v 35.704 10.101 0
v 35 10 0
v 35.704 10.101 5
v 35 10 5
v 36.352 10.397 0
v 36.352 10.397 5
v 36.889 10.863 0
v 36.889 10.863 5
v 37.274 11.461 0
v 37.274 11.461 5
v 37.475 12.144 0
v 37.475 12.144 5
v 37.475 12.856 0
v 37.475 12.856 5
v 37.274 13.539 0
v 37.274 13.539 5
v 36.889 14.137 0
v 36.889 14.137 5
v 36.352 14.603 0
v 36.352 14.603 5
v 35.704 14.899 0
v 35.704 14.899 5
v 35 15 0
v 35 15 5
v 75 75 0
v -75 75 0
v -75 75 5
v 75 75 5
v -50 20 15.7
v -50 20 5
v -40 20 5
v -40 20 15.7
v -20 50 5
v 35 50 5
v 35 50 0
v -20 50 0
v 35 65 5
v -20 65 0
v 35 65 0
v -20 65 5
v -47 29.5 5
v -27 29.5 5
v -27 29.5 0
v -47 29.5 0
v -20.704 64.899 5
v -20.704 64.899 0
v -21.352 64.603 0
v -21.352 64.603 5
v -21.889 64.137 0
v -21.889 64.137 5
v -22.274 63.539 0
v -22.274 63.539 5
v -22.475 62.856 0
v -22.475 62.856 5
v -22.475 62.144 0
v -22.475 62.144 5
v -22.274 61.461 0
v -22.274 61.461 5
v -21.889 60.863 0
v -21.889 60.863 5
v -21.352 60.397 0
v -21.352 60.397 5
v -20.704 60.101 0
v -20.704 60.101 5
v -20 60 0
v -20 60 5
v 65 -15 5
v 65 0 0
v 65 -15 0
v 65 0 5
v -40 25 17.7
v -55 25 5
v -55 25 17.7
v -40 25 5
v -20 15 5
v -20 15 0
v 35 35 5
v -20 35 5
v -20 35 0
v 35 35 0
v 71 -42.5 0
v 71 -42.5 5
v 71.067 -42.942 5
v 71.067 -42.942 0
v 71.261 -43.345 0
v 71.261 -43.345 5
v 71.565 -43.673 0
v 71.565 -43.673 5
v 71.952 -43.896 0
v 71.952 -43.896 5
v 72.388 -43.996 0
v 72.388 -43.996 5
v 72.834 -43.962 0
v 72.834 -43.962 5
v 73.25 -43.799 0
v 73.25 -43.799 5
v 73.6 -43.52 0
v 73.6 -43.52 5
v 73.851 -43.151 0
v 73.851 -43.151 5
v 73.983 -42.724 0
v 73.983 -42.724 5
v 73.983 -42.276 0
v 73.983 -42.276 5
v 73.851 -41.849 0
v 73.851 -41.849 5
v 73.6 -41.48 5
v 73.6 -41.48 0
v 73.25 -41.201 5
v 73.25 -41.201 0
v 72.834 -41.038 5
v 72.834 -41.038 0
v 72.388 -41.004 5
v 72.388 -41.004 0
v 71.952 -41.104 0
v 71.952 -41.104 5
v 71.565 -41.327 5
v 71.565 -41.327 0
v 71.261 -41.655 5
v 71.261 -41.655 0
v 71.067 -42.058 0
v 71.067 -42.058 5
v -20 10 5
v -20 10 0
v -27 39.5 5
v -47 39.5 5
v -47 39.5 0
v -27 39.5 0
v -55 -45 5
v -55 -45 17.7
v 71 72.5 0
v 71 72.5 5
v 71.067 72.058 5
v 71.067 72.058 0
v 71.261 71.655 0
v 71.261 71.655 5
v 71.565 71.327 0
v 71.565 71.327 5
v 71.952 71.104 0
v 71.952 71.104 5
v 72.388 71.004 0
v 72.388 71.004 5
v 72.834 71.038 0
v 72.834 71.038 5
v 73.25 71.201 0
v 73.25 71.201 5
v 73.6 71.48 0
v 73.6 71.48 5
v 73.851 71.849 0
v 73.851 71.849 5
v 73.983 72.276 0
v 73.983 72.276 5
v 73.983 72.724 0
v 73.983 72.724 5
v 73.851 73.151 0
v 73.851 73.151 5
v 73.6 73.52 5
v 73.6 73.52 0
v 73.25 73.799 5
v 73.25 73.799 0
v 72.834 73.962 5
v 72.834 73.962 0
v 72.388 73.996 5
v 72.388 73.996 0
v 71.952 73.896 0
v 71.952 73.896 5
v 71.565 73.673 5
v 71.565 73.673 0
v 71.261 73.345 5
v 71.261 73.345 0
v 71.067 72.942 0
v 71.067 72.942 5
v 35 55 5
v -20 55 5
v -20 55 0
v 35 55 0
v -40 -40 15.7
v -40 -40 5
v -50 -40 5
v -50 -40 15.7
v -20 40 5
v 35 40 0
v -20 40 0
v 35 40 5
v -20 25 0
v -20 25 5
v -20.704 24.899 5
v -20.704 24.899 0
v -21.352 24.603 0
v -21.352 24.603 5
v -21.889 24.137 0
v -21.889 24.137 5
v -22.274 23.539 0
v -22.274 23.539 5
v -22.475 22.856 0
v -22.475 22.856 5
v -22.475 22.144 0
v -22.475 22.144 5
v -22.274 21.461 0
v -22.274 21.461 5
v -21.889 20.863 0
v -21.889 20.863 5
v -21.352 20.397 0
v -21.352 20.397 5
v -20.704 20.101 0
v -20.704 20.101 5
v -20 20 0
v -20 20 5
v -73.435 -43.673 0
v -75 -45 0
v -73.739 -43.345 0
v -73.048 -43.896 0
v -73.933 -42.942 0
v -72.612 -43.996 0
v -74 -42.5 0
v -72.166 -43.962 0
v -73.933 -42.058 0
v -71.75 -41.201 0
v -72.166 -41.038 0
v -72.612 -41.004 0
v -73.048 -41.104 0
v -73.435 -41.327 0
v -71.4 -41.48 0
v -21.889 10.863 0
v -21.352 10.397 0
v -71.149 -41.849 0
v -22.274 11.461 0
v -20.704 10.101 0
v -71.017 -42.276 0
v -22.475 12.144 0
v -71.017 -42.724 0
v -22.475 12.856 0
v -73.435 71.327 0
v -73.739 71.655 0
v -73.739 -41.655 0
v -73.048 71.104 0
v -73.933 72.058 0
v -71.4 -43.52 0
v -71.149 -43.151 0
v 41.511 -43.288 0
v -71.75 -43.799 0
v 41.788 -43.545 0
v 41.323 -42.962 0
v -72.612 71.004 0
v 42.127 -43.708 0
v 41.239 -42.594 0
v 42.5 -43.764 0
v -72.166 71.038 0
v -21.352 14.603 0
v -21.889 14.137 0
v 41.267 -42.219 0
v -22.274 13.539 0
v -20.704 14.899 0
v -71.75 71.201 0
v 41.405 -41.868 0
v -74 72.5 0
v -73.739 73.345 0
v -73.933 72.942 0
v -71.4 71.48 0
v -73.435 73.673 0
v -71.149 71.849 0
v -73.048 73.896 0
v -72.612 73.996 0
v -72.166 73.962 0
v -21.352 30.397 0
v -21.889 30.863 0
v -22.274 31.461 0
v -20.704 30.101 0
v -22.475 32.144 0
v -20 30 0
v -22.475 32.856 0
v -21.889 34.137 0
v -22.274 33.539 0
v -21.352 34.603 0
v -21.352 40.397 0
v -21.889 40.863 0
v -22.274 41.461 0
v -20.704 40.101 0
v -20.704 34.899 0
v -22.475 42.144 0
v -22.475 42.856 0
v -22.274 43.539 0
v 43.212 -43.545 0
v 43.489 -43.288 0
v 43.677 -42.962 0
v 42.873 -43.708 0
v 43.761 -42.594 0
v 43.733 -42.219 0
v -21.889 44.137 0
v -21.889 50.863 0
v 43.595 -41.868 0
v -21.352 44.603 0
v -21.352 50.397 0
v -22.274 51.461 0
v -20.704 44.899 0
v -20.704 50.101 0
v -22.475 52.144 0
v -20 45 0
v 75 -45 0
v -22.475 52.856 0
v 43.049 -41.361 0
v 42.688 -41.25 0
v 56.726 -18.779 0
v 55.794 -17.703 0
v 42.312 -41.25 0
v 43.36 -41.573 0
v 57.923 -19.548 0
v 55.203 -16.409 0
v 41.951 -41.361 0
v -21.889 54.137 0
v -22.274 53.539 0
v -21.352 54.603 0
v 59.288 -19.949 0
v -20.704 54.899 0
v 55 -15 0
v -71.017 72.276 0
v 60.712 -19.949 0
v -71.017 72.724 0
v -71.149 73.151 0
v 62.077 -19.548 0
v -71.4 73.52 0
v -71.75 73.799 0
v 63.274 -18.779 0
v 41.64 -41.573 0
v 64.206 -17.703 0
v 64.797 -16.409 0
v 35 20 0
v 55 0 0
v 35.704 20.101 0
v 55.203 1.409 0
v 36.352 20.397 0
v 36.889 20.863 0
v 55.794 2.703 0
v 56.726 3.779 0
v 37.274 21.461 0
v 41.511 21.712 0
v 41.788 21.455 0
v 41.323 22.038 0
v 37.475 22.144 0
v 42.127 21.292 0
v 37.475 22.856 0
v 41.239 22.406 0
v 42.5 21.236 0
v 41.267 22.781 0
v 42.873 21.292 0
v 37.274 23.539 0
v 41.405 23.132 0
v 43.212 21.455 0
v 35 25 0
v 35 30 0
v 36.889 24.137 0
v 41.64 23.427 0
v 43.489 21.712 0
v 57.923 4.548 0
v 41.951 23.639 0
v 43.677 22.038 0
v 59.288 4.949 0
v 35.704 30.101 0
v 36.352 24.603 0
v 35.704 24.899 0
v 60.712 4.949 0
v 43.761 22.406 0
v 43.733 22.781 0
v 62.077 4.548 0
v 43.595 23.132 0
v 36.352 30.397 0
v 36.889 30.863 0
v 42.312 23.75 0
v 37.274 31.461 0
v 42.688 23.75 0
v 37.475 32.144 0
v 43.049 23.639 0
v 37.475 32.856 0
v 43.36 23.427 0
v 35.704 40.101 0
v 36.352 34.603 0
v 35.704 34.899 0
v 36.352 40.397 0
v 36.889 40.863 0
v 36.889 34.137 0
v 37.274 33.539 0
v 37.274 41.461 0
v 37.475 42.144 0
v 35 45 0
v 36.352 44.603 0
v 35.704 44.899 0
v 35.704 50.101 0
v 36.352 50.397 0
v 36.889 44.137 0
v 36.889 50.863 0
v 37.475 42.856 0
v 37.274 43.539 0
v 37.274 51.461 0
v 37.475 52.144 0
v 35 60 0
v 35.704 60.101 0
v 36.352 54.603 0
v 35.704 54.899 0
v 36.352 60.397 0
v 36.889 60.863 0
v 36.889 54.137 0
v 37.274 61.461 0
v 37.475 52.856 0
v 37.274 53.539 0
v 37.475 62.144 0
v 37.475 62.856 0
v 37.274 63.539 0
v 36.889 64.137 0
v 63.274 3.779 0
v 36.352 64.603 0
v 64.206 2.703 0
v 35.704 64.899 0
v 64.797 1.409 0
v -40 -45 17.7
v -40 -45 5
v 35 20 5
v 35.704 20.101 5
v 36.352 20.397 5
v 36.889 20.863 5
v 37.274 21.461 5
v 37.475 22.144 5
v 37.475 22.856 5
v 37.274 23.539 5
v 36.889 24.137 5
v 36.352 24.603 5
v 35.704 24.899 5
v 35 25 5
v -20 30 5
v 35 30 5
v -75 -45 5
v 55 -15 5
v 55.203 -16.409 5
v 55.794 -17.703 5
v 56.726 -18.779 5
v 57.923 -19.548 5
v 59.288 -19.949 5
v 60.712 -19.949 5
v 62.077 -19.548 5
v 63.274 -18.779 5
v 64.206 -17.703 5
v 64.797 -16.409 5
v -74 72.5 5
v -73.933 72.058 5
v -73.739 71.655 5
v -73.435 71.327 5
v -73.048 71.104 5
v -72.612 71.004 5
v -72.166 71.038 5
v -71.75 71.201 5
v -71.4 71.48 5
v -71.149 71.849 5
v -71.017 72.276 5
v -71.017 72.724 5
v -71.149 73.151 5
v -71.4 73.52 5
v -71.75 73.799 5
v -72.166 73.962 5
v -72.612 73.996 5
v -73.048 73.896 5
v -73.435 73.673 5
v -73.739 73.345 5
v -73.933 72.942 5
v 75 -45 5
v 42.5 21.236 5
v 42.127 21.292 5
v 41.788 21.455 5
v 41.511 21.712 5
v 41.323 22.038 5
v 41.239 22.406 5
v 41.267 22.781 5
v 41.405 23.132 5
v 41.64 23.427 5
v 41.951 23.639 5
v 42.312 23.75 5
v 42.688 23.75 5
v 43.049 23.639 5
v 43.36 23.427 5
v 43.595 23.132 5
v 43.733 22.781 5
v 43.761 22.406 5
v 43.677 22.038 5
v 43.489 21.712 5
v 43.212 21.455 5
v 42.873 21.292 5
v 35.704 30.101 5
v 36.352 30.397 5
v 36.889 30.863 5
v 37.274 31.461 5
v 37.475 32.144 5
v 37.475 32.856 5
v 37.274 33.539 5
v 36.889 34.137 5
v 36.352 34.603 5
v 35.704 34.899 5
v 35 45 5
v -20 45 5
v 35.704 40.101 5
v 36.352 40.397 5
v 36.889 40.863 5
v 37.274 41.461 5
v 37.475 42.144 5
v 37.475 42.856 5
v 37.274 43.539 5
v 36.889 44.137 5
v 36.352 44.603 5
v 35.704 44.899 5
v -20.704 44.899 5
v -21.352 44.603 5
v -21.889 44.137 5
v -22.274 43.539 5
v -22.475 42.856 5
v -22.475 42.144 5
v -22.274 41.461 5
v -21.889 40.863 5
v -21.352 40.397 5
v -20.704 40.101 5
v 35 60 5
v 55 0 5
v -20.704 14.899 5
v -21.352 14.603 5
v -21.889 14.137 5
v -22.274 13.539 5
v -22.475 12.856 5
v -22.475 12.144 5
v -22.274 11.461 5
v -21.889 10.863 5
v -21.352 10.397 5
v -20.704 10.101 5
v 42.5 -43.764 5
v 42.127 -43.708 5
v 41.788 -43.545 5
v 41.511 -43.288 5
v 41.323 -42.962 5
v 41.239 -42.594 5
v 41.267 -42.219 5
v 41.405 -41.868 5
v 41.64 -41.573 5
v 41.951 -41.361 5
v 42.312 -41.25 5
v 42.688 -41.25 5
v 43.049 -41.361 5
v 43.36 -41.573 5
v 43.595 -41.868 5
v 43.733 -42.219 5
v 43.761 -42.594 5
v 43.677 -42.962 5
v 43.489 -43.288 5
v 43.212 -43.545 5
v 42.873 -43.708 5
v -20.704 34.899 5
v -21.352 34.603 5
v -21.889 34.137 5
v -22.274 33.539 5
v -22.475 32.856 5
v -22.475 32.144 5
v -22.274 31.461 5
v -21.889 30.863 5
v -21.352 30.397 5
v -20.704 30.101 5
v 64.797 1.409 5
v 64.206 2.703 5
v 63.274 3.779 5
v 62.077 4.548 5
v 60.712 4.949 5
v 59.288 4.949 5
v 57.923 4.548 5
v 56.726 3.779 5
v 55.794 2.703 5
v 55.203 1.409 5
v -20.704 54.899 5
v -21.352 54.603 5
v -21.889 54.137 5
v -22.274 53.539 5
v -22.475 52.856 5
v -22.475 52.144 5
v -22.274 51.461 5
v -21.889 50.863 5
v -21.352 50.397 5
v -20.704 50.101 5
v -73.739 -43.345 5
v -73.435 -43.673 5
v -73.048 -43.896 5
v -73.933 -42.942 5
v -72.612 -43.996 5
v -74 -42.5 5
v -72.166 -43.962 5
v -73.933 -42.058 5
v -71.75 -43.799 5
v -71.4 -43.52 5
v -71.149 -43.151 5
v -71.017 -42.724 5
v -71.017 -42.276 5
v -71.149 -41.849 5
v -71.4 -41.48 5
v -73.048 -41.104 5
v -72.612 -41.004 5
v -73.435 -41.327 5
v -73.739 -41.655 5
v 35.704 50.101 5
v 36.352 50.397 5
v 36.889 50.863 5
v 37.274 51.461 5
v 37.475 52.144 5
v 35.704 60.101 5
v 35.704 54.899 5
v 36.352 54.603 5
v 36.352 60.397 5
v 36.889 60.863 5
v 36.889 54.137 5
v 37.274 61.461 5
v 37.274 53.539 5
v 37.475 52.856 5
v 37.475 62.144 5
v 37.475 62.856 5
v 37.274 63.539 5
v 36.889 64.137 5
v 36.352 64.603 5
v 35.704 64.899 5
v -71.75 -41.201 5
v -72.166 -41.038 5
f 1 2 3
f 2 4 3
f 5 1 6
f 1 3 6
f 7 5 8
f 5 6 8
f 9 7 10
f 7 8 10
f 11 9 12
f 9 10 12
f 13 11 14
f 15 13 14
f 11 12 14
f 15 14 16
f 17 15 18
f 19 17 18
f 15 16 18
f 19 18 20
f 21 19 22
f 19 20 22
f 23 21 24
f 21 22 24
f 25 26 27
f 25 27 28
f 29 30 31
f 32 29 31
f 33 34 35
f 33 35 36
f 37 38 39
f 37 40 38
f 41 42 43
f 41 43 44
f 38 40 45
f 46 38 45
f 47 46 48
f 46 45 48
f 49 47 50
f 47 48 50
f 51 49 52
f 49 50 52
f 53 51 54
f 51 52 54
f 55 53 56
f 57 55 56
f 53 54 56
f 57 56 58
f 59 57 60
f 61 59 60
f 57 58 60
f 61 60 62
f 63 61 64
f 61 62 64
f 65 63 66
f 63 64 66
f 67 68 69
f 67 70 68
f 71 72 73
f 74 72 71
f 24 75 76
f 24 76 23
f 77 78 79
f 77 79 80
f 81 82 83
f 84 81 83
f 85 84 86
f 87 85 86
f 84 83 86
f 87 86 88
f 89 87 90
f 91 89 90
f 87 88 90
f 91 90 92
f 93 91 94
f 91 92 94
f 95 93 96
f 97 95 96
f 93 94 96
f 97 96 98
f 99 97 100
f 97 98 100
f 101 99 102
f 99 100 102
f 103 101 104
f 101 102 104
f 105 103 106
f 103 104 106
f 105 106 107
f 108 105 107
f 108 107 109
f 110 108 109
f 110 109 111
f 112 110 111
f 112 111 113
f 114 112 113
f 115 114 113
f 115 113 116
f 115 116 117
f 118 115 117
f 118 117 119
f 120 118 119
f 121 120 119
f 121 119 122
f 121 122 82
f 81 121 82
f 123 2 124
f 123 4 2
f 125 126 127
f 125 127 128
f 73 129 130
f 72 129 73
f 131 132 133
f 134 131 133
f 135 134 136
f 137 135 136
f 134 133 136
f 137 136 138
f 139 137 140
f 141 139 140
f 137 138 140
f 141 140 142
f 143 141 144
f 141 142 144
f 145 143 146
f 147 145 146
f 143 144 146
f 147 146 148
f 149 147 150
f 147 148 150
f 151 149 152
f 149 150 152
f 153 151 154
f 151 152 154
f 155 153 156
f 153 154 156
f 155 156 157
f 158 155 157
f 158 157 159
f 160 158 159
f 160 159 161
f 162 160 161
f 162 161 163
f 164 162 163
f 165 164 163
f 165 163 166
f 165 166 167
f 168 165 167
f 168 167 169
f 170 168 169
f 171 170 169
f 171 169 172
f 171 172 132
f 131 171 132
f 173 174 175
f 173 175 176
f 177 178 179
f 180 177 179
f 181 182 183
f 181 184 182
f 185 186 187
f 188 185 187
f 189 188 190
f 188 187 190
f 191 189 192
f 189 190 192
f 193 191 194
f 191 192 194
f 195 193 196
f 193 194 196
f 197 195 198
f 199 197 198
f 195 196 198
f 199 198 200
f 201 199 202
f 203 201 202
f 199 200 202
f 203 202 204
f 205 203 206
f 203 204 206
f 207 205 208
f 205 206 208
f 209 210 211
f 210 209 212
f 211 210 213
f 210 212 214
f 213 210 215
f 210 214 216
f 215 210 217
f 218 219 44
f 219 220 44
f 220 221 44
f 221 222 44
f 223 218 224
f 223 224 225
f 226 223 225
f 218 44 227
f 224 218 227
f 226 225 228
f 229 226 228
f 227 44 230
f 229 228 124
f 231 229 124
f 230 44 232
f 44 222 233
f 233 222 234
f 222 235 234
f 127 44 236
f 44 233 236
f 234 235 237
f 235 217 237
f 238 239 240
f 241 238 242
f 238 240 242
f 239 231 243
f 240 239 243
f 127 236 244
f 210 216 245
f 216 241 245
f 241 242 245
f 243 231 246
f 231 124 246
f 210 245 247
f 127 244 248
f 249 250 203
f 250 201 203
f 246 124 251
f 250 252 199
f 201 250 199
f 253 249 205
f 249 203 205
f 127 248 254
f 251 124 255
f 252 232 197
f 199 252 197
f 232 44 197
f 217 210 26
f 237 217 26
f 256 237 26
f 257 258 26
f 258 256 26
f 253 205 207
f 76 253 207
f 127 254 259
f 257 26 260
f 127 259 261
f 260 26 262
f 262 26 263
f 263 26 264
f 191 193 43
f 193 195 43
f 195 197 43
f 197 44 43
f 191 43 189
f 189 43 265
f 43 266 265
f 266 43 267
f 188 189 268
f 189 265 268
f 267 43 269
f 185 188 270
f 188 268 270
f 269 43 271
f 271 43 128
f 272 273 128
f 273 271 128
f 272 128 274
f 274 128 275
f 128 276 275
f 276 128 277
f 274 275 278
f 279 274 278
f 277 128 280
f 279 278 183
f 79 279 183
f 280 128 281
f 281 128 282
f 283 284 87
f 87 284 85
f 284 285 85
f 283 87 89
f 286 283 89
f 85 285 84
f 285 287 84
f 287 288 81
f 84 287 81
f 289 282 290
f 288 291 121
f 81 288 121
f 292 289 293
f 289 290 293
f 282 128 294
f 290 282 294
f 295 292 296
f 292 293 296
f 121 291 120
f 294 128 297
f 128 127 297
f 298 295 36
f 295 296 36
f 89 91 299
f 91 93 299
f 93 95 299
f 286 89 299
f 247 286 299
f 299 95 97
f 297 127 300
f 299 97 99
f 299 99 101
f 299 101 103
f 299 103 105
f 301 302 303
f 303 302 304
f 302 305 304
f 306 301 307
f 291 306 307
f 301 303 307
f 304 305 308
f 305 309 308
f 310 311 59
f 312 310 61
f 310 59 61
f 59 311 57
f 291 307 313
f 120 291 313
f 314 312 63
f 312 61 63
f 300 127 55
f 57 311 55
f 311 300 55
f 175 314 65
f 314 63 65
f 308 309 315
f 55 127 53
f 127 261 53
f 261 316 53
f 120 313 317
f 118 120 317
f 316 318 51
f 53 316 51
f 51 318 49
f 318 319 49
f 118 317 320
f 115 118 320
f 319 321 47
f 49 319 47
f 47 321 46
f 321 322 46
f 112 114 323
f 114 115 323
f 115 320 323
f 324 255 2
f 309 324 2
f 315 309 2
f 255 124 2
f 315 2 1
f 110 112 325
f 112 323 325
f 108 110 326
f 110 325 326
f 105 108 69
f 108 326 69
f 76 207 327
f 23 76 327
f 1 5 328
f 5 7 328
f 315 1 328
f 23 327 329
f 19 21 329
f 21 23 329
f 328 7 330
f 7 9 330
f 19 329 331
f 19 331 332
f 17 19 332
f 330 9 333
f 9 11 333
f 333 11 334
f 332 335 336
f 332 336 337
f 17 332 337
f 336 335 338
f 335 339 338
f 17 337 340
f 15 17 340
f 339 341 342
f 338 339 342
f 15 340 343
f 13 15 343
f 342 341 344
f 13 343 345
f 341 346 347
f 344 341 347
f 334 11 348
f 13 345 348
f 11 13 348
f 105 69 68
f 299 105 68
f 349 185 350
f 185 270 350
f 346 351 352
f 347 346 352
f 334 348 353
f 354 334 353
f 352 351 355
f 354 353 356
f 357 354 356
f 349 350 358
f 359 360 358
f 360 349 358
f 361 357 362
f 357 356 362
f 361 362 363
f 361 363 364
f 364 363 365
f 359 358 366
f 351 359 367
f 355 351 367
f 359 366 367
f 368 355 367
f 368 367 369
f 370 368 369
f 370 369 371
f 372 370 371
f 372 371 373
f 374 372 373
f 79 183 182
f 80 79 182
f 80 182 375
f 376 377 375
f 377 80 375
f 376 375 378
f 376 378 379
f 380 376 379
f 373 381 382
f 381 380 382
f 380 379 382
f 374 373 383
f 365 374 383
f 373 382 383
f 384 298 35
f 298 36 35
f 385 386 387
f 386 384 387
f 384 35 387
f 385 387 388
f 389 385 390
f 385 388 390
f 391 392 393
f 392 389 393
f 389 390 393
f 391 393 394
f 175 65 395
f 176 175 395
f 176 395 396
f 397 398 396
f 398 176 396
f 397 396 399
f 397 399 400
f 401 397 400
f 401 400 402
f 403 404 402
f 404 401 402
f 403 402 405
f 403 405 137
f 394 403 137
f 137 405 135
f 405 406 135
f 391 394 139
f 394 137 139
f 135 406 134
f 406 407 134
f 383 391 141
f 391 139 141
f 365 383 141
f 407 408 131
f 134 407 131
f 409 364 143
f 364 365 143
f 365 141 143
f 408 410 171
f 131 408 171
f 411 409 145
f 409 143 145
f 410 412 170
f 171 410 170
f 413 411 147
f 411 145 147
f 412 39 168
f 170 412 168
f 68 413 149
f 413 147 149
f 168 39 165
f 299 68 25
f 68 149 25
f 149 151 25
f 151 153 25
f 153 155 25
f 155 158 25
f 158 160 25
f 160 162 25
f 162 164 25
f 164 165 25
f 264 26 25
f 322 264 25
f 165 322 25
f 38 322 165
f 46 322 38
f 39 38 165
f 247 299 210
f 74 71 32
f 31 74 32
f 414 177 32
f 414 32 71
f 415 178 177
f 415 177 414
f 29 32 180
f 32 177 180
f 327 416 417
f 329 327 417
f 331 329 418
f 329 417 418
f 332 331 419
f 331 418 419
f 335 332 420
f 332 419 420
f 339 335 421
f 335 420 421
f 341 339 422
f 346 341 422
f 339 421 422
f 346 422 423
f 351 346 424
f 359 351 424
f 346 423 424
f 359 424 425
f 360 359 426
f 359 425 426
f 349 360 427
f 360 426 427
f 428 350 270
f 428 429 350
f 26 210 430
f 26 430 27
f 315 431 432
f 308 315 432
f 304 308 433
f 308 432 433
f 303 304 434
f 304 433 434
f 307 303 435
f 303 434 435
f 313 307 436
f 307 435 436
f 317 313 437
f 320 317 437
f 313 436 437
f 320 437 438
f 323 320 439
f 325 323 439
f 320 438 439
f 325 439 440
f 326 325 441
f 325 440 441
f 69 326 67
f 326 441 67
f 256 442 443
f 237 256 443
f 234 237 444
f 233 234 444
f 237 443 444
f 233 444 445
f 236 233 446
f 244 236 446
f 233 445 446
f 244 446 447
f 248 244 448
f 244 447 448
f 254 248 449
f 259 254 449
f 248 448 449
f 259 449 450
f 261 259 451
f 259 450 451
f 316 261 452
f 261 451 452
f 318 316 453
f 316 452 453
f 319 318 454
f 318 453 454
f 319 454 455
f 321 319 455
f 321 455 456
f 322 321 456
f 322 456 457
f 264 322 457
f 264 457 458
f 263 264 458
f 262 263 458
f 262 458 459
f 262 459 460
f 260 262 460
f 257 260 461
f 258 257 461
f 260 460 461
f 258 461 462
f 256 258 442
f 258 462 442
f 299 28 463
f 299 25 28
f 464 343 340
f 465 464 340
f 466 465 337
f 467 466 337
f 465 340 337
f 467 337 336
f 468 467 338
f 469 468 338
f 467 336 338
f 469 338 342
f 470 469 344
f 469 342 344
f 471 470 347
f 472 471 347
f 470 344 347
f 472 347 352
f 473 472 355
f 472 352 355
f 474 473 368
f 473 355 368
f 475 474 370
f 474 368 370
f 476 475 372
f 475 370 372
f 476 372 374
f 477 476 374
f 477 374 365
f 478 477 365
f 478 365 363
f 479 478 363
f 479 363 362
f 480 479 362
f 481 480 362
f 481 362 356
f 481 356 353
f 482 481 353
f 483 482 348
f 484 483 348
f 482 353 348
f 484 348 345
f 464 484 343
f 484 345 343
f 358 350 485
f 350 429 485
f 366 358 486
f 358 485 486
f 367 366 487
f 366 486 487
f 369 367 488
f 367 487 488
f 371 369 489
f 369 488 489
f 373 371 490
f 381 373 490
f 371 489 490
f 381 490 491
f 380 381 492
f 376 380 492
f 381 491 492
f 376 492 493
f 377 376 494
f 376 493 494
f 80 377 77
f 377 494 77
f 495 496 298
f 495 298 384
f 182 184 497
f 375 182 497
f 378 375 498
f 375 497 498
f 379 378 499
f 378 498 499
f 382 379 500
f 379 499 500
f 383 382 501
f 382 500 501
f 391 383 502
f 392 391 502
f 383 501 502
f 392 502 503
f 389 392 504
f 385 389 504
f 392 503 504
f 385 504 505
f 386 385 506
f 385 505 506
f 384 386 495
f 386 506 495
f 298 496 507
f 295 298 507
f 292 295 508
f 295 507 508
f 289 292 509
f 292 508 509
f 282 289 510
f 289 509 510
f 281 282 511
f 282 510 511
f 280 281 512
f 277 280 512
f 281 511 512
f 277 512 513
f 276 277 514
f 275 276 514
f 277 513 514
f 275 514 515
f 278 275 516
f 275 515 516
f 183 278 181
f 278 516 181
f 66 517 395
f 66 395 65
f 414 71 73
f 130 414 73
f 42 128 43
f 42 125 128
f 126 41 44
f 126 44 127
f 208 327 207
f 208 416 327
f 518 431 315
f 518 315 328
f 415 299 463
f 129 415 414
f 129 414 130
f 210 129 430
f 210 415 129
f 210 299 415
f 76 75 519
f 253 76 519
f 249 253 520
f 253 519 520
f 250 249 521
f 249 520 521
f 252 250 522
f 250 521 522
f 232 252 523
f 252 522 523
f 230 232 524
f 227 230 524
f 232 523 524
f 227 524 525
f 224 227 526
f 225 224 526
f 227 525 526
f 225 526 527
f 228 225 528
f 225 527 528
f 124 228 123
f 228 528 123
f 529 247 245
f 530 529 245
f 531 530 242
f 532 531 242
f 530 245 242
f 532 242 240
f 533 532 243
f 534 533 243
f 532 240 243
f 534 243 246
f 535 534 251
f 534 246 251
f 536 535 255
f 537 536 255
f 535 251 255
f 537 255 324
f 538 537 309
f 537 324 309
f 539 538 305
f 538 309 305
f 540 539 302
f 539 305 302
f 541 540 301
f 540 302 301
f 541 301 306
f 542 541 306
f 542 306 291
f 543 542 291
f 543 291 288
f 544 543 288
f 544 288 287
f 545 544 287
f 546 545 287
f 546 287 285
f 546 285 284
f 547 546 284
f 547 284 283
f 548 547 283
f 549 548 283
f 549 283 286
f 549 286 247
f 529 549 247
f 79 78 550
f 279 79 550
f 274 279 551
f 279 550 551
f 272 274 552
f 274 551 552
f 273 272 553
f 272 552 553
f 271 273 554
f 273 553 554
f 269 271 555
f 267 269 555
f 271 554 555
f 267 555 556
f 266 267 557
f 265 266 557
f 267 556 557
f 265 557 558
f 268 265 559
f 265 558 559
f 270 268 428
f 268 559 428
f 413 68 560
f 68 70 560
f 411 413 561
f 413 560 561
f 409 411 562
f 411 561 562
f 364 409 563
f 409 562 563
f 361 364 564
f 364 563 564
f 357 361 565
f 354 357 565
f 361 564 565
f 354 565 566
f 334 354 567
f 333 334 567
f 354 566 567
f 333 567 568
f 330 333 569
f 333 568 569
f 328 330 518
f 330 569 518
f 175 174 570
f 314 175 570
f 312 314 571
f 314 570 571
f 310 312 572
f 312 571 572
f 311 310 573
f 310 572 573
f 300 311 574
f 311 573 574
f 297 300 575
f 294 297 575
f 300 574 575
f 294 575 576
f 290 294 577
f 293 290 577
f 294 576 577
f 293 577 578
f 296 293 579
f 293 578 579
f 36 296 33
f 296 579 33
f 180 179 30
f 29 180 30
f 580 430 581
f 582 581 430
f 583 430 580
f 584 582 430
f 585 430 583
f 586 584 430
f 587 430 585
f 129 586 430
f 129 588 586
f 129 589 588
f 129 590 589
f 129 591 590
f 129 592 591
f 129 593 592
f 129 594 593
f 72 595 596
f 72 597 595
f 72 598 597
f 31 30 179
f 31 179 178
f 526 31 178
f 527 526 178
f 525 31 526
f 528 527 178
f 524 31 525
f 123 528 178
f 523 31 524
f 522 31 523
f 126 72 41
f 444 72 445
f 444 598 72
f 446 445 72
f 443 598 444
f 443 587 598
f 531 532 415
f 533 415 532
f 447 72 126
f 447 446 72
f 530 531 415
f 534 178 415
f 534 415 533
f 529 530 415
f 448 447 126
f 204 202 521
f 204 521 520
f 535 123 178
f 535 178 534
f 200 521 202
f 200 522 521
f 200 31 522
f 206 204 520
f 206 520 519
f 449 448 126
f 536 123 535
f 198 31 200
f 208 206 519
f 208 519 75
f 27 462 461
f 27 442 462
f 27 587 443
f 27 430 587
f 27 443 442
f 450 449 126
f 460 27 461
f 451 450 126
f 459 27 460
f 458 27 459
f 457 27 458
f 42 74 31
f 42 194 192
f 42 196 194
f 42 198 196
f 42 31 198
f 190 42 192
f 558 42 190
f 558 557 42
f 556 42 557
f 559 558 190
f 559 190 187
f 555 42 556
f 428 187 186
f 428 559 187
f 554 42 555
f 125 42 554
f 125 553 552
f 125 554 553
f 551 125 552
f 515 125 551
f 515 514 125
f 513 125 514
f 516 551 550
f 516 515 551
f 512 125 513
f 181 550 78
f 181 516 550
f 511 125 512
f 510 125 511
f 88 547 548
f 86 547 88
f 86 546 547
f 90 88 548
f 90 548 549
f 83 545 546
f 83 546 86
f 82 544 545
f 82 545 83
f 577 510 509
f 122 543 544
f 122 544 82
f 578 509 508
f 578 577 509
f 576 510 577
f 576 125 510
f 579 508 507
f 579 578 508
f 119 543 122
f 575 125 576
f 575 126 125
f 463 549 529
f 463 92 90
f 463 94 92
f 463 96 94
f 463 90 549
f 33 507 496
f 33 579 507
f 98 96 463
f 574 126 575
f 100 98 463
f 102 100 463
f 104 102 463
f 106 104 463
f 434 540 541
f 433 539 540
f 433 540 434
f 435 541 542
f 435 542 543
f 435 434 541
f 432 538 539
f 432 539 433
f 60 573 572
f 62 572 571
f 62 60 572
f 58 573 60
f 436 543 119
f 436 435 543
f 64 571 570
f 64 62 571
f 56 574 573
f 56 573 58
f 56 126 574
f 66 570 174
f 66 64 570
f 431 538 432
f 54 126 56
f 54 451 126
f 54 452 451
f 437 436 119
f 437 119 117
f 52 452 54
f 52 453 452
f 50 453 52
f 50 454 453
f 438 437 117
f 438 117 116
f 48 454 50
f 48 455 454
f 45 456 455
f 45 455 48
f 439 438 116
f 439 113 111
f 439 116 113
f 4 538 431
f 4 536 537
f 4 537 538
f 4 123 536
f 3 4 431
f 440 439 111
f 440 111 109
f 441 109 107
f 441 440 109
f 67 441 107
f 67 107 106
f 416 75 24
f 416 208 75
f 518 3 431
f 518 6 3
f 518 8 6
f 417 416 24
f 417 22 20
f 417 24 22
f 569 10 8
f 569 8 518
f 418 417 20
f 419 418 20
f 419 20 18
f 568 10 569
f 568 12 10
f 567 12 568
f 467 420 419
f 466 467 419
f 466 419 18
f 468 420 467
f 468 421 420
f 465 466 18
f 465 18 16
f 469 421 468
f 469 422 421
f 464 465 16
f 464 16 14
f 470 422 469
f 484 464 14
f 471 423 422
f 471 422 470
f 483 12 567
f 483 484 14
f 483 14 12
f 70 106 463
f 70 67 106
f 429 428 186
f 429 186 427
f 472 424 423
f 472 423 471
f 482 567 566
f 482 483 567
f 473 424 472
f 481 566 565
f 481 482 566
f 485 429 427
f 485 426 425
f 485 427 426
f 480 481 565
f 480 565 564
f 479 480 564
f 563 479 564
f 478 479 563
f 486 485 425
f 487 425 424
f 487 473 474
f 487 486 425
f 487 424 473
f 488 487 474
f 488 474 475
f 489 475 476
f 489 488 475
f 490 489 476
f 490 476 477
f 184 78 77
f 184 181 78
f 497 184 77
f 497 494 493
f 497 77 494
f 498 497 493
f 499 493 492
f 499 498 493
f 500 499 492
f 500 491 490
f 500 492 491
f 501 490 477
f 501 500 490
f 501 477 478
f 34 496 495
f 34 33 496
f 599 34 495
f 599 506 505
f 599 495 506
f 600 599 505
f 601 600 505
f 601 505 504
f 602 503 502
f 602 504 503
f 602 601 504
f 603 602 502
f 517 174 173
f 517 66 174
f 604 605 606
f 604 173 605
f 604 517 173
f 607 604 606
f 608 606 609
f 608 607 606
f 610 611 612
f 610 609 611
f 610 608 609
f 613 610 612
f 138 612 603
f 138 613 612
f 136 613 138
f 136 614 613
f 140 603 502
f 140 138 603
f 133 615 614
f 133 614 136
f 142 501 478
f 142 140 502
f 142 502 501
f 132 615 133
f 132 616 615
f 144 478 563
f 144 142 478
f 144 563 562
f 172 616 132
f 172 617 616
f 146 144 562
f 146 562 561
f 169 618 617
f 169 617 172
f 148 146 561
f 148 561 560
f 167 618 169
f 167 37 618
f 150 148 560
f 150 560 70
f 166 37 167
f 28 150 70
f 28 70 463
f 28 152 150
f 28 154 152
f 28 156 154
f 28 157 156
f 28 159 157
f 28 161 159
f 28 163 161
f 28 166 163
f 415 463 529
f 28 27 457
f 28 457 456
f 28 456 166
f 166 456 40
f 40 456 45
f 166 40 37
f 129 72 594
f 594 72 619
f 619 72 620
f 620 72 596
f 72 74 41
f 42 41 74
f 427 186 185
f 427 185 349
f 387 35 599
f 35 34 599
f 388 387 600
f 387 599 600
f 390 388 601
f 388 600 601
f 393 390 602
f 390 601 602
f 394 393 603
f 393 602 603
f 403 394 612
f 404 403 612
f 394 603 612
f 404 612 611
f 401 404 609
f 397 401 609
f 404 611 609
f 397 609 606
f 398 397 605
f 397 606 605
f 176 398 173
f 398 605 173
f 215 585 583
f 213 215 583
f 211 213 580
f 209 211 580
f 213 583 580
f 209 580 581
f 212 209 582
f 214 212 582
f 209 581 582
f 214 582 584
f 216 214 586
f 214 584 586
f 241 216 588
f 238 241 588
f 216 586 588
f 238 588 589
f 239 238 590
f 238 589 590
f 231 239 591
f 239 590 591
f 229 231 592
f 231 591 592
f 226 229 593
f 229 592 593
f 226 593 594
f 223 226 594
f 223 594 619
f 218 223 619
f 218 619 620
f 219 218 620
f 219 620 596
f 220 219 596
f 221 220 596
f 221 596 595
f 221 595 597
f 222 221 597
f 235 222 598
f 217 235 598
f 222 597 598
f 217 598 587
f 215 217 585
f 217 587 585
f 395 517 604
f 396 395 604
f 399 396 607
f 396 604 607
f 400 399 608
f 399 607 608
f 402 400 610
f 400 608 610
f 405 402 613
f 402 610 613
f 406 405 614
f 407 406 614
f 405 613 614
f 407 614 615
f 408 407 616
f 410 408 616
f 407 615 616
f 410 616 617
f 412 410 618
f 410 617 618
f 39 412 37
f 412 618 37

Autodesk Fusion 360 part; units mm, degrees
sketch "スケッチ1" plane through (0, 0, 0) normal (0, 0, 1) x (1, 0, 0)
  line L0 (75, -45) -> (-75, -45)
  line L1 (-75, -45) -> (-75, 75)
  line L2 (-75, 75) -> (75, 75)
  line L3 (75, 75) -> (75, -45)
  line L4 (-115.7726, 0) -> (130, 0)
  dimension "d1" = 150
  dimension "d41" = 75
  dimension "d42" = 45
extrude "押し出し1" add sketch "スケッチ1" along normal blind 5
sketch "スケッチ2" plane through (0, 0, 5) normal (0, 0, 1) x (-1, 0, 0)
  line L0 (-75, -75) -> (75, -75)
  line L1 (75, -75) -> (75, 45)
  line L2 (75, 45) -> (-75, 45)
  line L3 (-75, 45) -> (-75, -75)
  circle A0 centre (72.5, -72.5) radius 1.5
  line L4 (0, -100) -> (0, -20)
  circle A1 centre (-72.5, -72.5) radius 1.5
  line L5 (50, 0) -> (-80, 0)
  circle A2 centre (72.5, 72.5) radius 1.5
  circle A3 centre (-72.5, 72.5) radius 1.5
  dimension "d5" = 3
  dimension "d6" = 2.5
  dimension "d7" = 2.5
extrude "押し出し2" cut sketch "スケッチ2" against normal blind 5 contours A0 | A1 | A2 | A3
sketch "スケッチ3" plane through (0, 0, 5) normal (0, 0, 1) x (-1, 0, 0)
  circle A0 centre (-72.5, -72.5) radius 1.5
  circle A1 centre (72.5, -72.5) radius 1.5
  line L0 (-75, -75) -> (75, -75)
  line L1 (75, -75) -> (75, 45)
  line L2 (75, 45) -> (-75, 45)
  line L3 (-75, 45) -> (-75, -75)
  line L4 (47, -39.5) -> (27, -39.5)
  line L5 (27, -39.5) -> (27, -29.5)
  line L6 (27, -29.5) -> (47, -29.5)
  line L7 (47, -29.5) -> (47, -39.5)
  dimension "d10" = 28
  dimension "d11" = 45.5
  dimension "d12" = 10
  dimension "d13" = 20
extrude "押し出し3" cut sketch "スケッチ3" against normal blind 5 contours L4 L5 L6 L7
sketch "スケッチ4" plane through (0, 0, 5) normal (0, 0, 1) x (-1, 0, 0)
  line L0 (27, -39.5) -> (27, -29.5)
  line L1 (27, -29.5) -> (47, -29.5)
  line L2 (47, -29.5) -> (47, -39.5)
  line L3 (47, -39.5) -> (27, -39.5)
  circle A0 centre (-72.5, -72.5) radius 1.5
  circle A1 centre (72.5, -72.5) radius 1.5
  line L4 (-75, -75) -> (75, -75)
  line L5 (75, -75) -> (75, 45)
  line L6 (75, 45) -> (-75, 45)
  line L7 (-75, 45) -> (-75, -75)
  line L8 (20, -65) -> (-35, -65)
  line L9 (-35, -60) -> (20, -60)
  line L10 (20, -55) -> (-35, -55)
  line L11 (-35, -50) -> (20, -50)
  line L12 (20, -45) -> (-35, -45)
  line L13 (-35, -40) -> (20, -40)
  line L14 (20, -35) -> (-35, -35)
  line L15 (-35, -30) -> (20, -30)
  line L16 (20, -25) -> (-35, -25)
  line L17 (-35, -20) -> (20, -20)
  line L18 (20, -15) -> (-35, -15)
  line L19 (-35, -10) -> (20, -10)
  arc A2 (20, -65) -> (20, -60) centre (20, -62.5) ccw
  arc A3 (20, -55) -> (20, -50) centre (20, -52.5) ccw
  arc A4 (20, -45) -> (20, -40) centre (20, -42.5) ccw
  arc A5 (20, -35) -> (20, -30) centre (20, -32.5) ccw
  arc A6 (20, -25) -> (20, -20) centre (20, -22.5) ccw
  arc A7 (20, -15) -> (20, -10) centre (20, -12.5) ccw
  arc A8 (-35, -10) -> (-35, -15) centre (-35, -12.5) ccw
  arc A9 (-35, -20) -> (-35, -25) centre (-35, -22.5) ccw
  arc A10 (-35, -30) -> (-35, -35) centre (-35, -32.5) ccw
  arc A11 (-35, -40) -> (-35, -45) centre (-35, -42.5) ccw
  arc A12 (-35, -50) -> (-35, -55) centre (-35, -52.5) ccw
  arc A13 (-35, -60) -> (-35, -65) centre (-35, -62.5) ccw
extrude "押し出し4" cut sketch "スケッチ4" against normal blind 5 contours L8 L9 A2 A13 | L10 L11 A3 A12 | L12 L13 A4 A11 | L14 L15 A5 A10 | L16 L17 A6 A9 | L18 L19 A7 A8
sketch "スケッチ5" plane through (0, 0, 5) normal (0, 0, 1) x (-1, 0, 0)
  line L0 (-35, -30) -> (20, -30)
  arc A0 (20, -35) -> (20, -30) centre (20, -32.5) ccw
  line L1 (20, -35) -> (-35, -35)
  arc A1 (-35, -30) -> (-35, -35) centre (-35, -32.5) ccw
  line L2 (-35, -60) -> (20, -60)
  arc A2 (20, -65) -> (20, -60) centre (20, -62.5) ccw
  line L3 (20, -65) -> (-35, -65)
  arc A3 (-35, -60) -> (-35, -65) centre (-35, -62.5) ccw
  line L4 (-35, -50) -> (20, -50)
  arc A4 (20, -55) -> (20, -50) centre (20, -52.5) ccw
  line L5 (20, -55) -> (-35, -55)
  arc A5 (-35, -50) -> (-35, -55) centre (-35, -52.5) ccw
  line L6 (-35, -20) -> (20, -20)
  arc A6 (20, -25) -> (20, -20) centre (20, -22.5) ccw
  line L7 (20, -25) -> (-35, -25)
  arc A7 (-35, -20) -> (-35, -25) centre (-35, -22.5) ccw
  line L8 (-35, -10) -> (20, -10)
  arc A8 (20, -15) -> (20, -10) centre (20, -12.5) ccw
  line L9 (20, -15) -> (-35, -15)
  arc A9 (-35, -10) -> (-35, -15) centre (-35, -12.5) ccw
  line L10 (-35, -40) -> (20, -40)
  arc A10 (20, -45) -> (20, -40) centre (20, -42.5) ccw
  line L11 (20, -45) -> (-35, -45)
  arc A11 (-35, -40) -> (-35, -45) centre (-35, -42.5) ccw
  line L12 (27, -39.5) -> (27, -29.5)
  line L13 (27, -29.5) -> (47, -29.5)
  line L14 (47, -29.5) -> (47, -39.5)
  line L15 (47, -39.5) -> (27, -39.5)
  circle A12 centre (-72.5, -72.5) radius 1.5
  circle A13 centre (72.5, -72.5) radius 1.5
  line L16 (-75, -75) -> (75, -75)
  line L17 (75, -75) -> (75, 45)
  line L18 (75, 45) -> (-75, 45)
  line L19 (-75, 45) -> (-75, -75)
  line L20 (50, -20) -> (40, -20)
  line L21 (40, 40) -> (50, 40)
  line L22 (50, 40) -> (50, -20)
  line L23 (55, -25) -> (40, -25)
  line L24 (40, 45) -> (55, 45)
  line L25 (55, 45) -> (55, -25)
  line L26 (40, -25) -> (40, -20)
  line L27 (40, 40) -> (40, 45)
  circle A14 centre (-52.5, -22.5) radius 1.5
  circle A15 centre (-52.5, 42.5) radius 1.5
  dimension "d18" = 60
  dimension "d20" = 3
  dimension "d21" = 3
  dimension "d22" = 2.5
  dimension "d25" = 2.5
extrude "押し出し5" add sketch "スケッチ5" along normal blind 10.7 contours L18 L20 L21 L22 L23 L24 L25 L26 L27
sketch "スケッチ7" plane through (0, 0, 15.7) normal (0, 0, 1) x (-1, 0, 0)
  line L0 (50, 40) -> (50, -20)
  line L1 (50, -20) -> (40, -20)
  line L2 (40, -20) -> (40, -25)
  line L3 (40, -25) -> (55, -25)
  line L4 (55, -25) -> (55, 45)
  line L5 (55, 45) -> (40, 45)
  line L6 (40, 45) -> (40, 40)
  line L7 (40, 40) -> (50, 40)
  line L8 (55, -25) -> (40, -25)
  line L9 (40, -25) -> (40, 45)
  line L10 (40, 45) -> (55, 45)
  line L11 (55, 45) -> (55, -25)
extrude "押し出し6" add sketch "スケッチ7" along normal blind 2
sketch "スケッチ8" plane through (0, 0, 5) normal (0, 0, 1) x (-1, 0, 0)
  line L0 (50, 40) -> (40, 40)
  line L1 (40, 40) -> (40, 45)
  line L2 (40, 45) -> (-75, 45)
  line L3 (55, 45) -> (55, -25)
  line L4 (55, -25) -> (40, -25)
  line L5 (40, -25) -> (40, -20)
  line L6 (40, -20) -> (50, -20)
  line L7 (50, -20) -> (50, 40)
  line L8 (-35, -30) -> (20, -30)
  arc A0 (20, -35) -> (20, -30) centre (20, -32.5) ccw
  line L9 (20, -35) -> (-35, -35)
  arc A1 (-35, -30) -> (-35, -35) centre (-35, -32.5) ccw
  line L10 (-35, -60) -> (20, -60)
  arc A2 (20, -65) -> (20, -60) centre (20, -62.5) ccw
  line L11 (20, -65) -> (-35, -65)
  arc A3 (-35, -60) -> (-35, -65) centre (-35, -62.5) ccw
  line L12 (-35, -50) -> (20, -50)
  arc A4 (20, -55) -> (20, -50) centre (20, -52.5) ccw
  line L13 (20, -55) -> (-35, -55)
  arc A5 (-35, -50) -> (-35, -55) centre (-35, -52.5) ccw
  line L14 (-35, -20) -> (20, -20)
  arc A6 (20, -25) -> (20, -20) centre (20, -22.5) ccw
  line L15 (20, -25) -> (-35, -25)
  arc A7 (-35, -20) -> (-35, -25) centre (-35, -22.5) ccw
  line L16 (-35, -10) -> (20, -10)
  arc A8 (20, -15) -> (20, -10) centre (20, -12.5) ccw
  line L17 (20, -15) -> (-35, -15)
  arc A9 (-35, -10) -> (-35, -15) centre (-35, -12.5) ccw
  line L18 (-35, -40) -> (20, -40)
  arc A10 (20, -45) -> (20, -40) centre (20, -42.5) ccw
  line L19 (20, -45) -> (-35, -45)
  arc A11 (-35, -40) -> (-35, -45) centre (-35, -42.5) ccw
  line L20 (27, -39.5) -> (27, -29.5)
  line L21 (27, -29.5) -> (47, -29.5)
  line L22 (47, -29.5) -> (47, -39.5)
  line L23 (47, -39.5) -> (27, -39.5)
  circle A12 centre (-72.5, -72.5) radius 1.5
  circle A13 centre (72.5, -72.5) radius 1.5
  line L24 (-75, -75) -> (75, -75)
  line L25 (75, -75) -> (75, 45)
  line L26 (75, 45) -> (55, 45)
  line L27 (-75, 45) -> (-75, -75)
  line L28 (55, -25) -> (-45, -25)
  line L29 (-45, -25) -> (-45, 45)
  line L30 (-45, 45) -> (55, 45)
  line L31 (55, 45) -> (55, -25)
  circle A14 centre (-42.5, -22.5) radius 1.5
  circle A15 centre (-42.5, 42.5) radius 1.5
  dimension "d30" = 3
  dimension "d31" = 2.5
  dimension "d32" = 2.5
  dimension "d33" = 3
  dimension "d34" = 2.5
  dimension "d35" = 2.5
hole "穴1" at (42.5, 22.5, 5) at (42.5, -42.5, 5) direction (0, 0, -1) diameter 2.529 depth 10 tip angle 118
sketch "スケッチ9" plane through (0, 0, 5) normal (0, 0, 1) x (-1, 0, 0)
  circle A0 centre (-42.5, -22.5) radius 1.2645
  circle A1 centre (-42.5, 42.5) radius 1.2645
  line L0 (50, 40) -> (40, 40)
  line L1 (40, 40) -> (40, 45)
  line L2 (40, 45) -> (-75, 45)
  line L3 (55, 45) -> (55, -25)
  line L4 (55, -25) -> (40, -25)
  line L5 (40, -25) -> (40, -20)
  line L6 (40, -20) -> (50, -20)
  line L7 (50, -20) -> (50, 40)
  line L8 (-35, -30) -> (20, -30)
  arc A2 (20, -35) -> (20, -30) centre (20, -32.5) ccw
  line L9 (20, -35) -> (-35, -35)
  arc A3 (-35, -30) -> (-35, -35) centre (-35, -32.5) ccw
  line L10 (-35, -60) -> (20, -60)
  arc A4 (20, -65) -> (20, -60) centre (20, -62.5) ccw
  line L11 (20, -65) -> (-35, -65)
  arc A5 (-35, -60) -> (-35, -65) centre (-35, -62.5) ccw
  line L12 (-35, -50) -> (20, -50)
  arc A6 (20, -55) -> (20, -50) centre (20, -52.5) ccw
  line L13 (20, -55) -> (-35, -55)
  arc A7 (-35, -50) -> (-35, -55) centre (-35, -52.5) ccw
  line L14 (-35, -20) -> (20, -20)
  arc A8 (20, -25) -> (20, -20) centre (20, -22.5) ccw
  line L15 (20, -25) -> (-35, -25)
  arc A9 (-35, -20) -> (-35, -25) centre (-35, -22.5) ccw
  line L16 (-35, -10) -> (20, -10)
  arc A10 (20, -15) -> (20, -10) centre (20, -12.5) ccw
  line L17 (20, -15) -> (-35, -15)
  arc A11 (-35, -10) -> (-35, -15) centre (-35, -12.5) ccw
  line L18 (-35, -40) -> (20, -40)
  arc A12 (20, -45) -> (20, -40) centre (20, -42.5) ccw
  line L19 (20, -45) -> (-35, -45)
  arc A13 (-35, -40) -> (-35, -45) centre (-35, -42.5) ccw
  line L20 (27, -39.5) -> (27, -29.5)
  line L21 (27, -29.5) -> (47, -29.5)
  line L22 (47, -29.5) -> (47, -39.5)
  line L23 (47, -39.5) -> (27, -39.5)
  circle A14 centre (-72.5, -72.5) radius 1.5
  circle A15 centre (72.5, -72.5) radius 1.5
  line L24 (-75, -75) -> (75, -75)
  line L25 (75, -75) -> (75, 45)
  line L26 (75, 45) -> (55, 45)
  line L27 (-75, 45) -> (-75, -75)
  line L28 (-65, 0) -> (-65, 15)
  line L29 (-55, 15) -> (-55, 0)
  arc A16 (-65, 0) -> (-55, 0) centre (-60, 0) ccw
  arc A17 (-55, 15) -> (-65, 15) centre (-60, 15) ccw
extrude "押し出し7" cut sketch "スケッチ9" against normal blind 5 contours L28 L29 A16 A17
sketch "スケッチ10" plane through (0, 0, 5) normal (0, 0, 1) x (-1, 0, 0)
  line L0 (-55, 15) -> (-55, 0)
  arc A0 (-65, 0) -> (-55, 0) centre (-60, 0) ccw
  line L1 (-65, 0) -> (-65, 15)
  arc A1 (-55, 15) -> (-65, 15) centre (-60, 15) ccw
  circle A2 centre (-42.5, -22.5) radius 1.2645
  circle A3 centre (-42.5, 42.5) radius 1.2645
  line L2 (55, 45) -> (55, -25)
  line L3 (55, -25) -> (40, -25)
  line L4 (40, -25) -> (40, -20)
  line L5 (40, -20) -> (50, -20)
  line L6 (50, -20) -> (50, 40)
  line L7 (50, 40) -> (40, 40)
  line L8 (40, 40) -> (40, 45)
  line L9 (40, 45) -> (-75, 45)
  line L10 (-75, 45) -> (-75, -75)
  line L11 (-75, -75) -> (75, -75)
  line L12 (75, -75) -> (75, 45)
  line L13 (75, 45) -> (55, 45)
  circle A4 centre (72.5, -72.5) radius 1.5
  circle A5 centre (-72.5, -72.5) radius 1.5
  line L14 (27, -39.5) -> (27, -29.5)
  line L15 (27, -29.5) -> (47, -29.5)
  line L16 (47, -29.5) -> (47, -39.5)
  line L17 (47, -39.5) -> (27, -39.5)
  line L18 (-35, -40) -> (20, -40)
  arc A6 (20, -45) -> (20, -40) centre (20, -42.5) ccw
  line L19 (20, -45) -> (-35, -45)
  arc A7 (-35, -40) -> (-35, -45) centre (-35, -42.5) ccw
  line L20 (-35, -10) -> (20, -10)
  arc A8 (20, -15) -> (20, -10) centre (20, -12.5) ccw
  line L21 (20, -15) -> (-35, -15)
  arc A9 (-35, -10) -> (-35, -15) centre (-35, -12.5) ccw
  line L22 (-35, -20) -> (20, -20)
  arc A10 (20, -25) -> (20, -20) centre (20, -22.5) ccw
  line L23 (20, -25) -> (-35, -25)
  arc A11 (-35, -20) -> (-35, -25) centre (-35, -22.5) ccw
  line L24 (-35, -50) -> (20, -50)
  arc A12 (20, -55) -> (20, -50) centre (20, -52.5) ccw
  line L25 (20, -55) -> (-35, -55)
  arc A13 (-35, -50) -> (-35, -55) centre (-35, -52.5) ccw
  line L26 (-35, -60) -> (20, -60)
  arc A14 (20, -65) -> (20, -60) centre (20, -62.5) ccw
  line L27 (20, -65) -> (-35, -65)
  arc A15 (-35, -60) -> (-35, -65) centre (-35, -62.5) ccw
  line L28 (-35, -30) -> (20, -30)
  arc A16 (20, -35) -> (20, -30) centre (20, -32.5) ccw
  line L29 (20, -35) -> (-35, -35)
  arc A17 (-35, -30) -> (-35, -35) centre (-35, -32.5) ccw
  circle A18 centre (72.5, 42.5) radius 1.5
  circle A19 centre (-72.5, 42.5) radius 1.5
  dimension "d43" = 3
  dimension "d44" = 2.5
  dimension "d45" = 2.5
  dimension "d46" = 3
  dimension "d47" = 2.5
  dimension "d48" = 2.5
extrude "押し出し8" cut sketch "スケッチ10" against normal blind 5 contours A18 | A19
equation "d11 = 35 mm + 10.50 mm"
equation "d42 = 75 mm - 30 mm"
